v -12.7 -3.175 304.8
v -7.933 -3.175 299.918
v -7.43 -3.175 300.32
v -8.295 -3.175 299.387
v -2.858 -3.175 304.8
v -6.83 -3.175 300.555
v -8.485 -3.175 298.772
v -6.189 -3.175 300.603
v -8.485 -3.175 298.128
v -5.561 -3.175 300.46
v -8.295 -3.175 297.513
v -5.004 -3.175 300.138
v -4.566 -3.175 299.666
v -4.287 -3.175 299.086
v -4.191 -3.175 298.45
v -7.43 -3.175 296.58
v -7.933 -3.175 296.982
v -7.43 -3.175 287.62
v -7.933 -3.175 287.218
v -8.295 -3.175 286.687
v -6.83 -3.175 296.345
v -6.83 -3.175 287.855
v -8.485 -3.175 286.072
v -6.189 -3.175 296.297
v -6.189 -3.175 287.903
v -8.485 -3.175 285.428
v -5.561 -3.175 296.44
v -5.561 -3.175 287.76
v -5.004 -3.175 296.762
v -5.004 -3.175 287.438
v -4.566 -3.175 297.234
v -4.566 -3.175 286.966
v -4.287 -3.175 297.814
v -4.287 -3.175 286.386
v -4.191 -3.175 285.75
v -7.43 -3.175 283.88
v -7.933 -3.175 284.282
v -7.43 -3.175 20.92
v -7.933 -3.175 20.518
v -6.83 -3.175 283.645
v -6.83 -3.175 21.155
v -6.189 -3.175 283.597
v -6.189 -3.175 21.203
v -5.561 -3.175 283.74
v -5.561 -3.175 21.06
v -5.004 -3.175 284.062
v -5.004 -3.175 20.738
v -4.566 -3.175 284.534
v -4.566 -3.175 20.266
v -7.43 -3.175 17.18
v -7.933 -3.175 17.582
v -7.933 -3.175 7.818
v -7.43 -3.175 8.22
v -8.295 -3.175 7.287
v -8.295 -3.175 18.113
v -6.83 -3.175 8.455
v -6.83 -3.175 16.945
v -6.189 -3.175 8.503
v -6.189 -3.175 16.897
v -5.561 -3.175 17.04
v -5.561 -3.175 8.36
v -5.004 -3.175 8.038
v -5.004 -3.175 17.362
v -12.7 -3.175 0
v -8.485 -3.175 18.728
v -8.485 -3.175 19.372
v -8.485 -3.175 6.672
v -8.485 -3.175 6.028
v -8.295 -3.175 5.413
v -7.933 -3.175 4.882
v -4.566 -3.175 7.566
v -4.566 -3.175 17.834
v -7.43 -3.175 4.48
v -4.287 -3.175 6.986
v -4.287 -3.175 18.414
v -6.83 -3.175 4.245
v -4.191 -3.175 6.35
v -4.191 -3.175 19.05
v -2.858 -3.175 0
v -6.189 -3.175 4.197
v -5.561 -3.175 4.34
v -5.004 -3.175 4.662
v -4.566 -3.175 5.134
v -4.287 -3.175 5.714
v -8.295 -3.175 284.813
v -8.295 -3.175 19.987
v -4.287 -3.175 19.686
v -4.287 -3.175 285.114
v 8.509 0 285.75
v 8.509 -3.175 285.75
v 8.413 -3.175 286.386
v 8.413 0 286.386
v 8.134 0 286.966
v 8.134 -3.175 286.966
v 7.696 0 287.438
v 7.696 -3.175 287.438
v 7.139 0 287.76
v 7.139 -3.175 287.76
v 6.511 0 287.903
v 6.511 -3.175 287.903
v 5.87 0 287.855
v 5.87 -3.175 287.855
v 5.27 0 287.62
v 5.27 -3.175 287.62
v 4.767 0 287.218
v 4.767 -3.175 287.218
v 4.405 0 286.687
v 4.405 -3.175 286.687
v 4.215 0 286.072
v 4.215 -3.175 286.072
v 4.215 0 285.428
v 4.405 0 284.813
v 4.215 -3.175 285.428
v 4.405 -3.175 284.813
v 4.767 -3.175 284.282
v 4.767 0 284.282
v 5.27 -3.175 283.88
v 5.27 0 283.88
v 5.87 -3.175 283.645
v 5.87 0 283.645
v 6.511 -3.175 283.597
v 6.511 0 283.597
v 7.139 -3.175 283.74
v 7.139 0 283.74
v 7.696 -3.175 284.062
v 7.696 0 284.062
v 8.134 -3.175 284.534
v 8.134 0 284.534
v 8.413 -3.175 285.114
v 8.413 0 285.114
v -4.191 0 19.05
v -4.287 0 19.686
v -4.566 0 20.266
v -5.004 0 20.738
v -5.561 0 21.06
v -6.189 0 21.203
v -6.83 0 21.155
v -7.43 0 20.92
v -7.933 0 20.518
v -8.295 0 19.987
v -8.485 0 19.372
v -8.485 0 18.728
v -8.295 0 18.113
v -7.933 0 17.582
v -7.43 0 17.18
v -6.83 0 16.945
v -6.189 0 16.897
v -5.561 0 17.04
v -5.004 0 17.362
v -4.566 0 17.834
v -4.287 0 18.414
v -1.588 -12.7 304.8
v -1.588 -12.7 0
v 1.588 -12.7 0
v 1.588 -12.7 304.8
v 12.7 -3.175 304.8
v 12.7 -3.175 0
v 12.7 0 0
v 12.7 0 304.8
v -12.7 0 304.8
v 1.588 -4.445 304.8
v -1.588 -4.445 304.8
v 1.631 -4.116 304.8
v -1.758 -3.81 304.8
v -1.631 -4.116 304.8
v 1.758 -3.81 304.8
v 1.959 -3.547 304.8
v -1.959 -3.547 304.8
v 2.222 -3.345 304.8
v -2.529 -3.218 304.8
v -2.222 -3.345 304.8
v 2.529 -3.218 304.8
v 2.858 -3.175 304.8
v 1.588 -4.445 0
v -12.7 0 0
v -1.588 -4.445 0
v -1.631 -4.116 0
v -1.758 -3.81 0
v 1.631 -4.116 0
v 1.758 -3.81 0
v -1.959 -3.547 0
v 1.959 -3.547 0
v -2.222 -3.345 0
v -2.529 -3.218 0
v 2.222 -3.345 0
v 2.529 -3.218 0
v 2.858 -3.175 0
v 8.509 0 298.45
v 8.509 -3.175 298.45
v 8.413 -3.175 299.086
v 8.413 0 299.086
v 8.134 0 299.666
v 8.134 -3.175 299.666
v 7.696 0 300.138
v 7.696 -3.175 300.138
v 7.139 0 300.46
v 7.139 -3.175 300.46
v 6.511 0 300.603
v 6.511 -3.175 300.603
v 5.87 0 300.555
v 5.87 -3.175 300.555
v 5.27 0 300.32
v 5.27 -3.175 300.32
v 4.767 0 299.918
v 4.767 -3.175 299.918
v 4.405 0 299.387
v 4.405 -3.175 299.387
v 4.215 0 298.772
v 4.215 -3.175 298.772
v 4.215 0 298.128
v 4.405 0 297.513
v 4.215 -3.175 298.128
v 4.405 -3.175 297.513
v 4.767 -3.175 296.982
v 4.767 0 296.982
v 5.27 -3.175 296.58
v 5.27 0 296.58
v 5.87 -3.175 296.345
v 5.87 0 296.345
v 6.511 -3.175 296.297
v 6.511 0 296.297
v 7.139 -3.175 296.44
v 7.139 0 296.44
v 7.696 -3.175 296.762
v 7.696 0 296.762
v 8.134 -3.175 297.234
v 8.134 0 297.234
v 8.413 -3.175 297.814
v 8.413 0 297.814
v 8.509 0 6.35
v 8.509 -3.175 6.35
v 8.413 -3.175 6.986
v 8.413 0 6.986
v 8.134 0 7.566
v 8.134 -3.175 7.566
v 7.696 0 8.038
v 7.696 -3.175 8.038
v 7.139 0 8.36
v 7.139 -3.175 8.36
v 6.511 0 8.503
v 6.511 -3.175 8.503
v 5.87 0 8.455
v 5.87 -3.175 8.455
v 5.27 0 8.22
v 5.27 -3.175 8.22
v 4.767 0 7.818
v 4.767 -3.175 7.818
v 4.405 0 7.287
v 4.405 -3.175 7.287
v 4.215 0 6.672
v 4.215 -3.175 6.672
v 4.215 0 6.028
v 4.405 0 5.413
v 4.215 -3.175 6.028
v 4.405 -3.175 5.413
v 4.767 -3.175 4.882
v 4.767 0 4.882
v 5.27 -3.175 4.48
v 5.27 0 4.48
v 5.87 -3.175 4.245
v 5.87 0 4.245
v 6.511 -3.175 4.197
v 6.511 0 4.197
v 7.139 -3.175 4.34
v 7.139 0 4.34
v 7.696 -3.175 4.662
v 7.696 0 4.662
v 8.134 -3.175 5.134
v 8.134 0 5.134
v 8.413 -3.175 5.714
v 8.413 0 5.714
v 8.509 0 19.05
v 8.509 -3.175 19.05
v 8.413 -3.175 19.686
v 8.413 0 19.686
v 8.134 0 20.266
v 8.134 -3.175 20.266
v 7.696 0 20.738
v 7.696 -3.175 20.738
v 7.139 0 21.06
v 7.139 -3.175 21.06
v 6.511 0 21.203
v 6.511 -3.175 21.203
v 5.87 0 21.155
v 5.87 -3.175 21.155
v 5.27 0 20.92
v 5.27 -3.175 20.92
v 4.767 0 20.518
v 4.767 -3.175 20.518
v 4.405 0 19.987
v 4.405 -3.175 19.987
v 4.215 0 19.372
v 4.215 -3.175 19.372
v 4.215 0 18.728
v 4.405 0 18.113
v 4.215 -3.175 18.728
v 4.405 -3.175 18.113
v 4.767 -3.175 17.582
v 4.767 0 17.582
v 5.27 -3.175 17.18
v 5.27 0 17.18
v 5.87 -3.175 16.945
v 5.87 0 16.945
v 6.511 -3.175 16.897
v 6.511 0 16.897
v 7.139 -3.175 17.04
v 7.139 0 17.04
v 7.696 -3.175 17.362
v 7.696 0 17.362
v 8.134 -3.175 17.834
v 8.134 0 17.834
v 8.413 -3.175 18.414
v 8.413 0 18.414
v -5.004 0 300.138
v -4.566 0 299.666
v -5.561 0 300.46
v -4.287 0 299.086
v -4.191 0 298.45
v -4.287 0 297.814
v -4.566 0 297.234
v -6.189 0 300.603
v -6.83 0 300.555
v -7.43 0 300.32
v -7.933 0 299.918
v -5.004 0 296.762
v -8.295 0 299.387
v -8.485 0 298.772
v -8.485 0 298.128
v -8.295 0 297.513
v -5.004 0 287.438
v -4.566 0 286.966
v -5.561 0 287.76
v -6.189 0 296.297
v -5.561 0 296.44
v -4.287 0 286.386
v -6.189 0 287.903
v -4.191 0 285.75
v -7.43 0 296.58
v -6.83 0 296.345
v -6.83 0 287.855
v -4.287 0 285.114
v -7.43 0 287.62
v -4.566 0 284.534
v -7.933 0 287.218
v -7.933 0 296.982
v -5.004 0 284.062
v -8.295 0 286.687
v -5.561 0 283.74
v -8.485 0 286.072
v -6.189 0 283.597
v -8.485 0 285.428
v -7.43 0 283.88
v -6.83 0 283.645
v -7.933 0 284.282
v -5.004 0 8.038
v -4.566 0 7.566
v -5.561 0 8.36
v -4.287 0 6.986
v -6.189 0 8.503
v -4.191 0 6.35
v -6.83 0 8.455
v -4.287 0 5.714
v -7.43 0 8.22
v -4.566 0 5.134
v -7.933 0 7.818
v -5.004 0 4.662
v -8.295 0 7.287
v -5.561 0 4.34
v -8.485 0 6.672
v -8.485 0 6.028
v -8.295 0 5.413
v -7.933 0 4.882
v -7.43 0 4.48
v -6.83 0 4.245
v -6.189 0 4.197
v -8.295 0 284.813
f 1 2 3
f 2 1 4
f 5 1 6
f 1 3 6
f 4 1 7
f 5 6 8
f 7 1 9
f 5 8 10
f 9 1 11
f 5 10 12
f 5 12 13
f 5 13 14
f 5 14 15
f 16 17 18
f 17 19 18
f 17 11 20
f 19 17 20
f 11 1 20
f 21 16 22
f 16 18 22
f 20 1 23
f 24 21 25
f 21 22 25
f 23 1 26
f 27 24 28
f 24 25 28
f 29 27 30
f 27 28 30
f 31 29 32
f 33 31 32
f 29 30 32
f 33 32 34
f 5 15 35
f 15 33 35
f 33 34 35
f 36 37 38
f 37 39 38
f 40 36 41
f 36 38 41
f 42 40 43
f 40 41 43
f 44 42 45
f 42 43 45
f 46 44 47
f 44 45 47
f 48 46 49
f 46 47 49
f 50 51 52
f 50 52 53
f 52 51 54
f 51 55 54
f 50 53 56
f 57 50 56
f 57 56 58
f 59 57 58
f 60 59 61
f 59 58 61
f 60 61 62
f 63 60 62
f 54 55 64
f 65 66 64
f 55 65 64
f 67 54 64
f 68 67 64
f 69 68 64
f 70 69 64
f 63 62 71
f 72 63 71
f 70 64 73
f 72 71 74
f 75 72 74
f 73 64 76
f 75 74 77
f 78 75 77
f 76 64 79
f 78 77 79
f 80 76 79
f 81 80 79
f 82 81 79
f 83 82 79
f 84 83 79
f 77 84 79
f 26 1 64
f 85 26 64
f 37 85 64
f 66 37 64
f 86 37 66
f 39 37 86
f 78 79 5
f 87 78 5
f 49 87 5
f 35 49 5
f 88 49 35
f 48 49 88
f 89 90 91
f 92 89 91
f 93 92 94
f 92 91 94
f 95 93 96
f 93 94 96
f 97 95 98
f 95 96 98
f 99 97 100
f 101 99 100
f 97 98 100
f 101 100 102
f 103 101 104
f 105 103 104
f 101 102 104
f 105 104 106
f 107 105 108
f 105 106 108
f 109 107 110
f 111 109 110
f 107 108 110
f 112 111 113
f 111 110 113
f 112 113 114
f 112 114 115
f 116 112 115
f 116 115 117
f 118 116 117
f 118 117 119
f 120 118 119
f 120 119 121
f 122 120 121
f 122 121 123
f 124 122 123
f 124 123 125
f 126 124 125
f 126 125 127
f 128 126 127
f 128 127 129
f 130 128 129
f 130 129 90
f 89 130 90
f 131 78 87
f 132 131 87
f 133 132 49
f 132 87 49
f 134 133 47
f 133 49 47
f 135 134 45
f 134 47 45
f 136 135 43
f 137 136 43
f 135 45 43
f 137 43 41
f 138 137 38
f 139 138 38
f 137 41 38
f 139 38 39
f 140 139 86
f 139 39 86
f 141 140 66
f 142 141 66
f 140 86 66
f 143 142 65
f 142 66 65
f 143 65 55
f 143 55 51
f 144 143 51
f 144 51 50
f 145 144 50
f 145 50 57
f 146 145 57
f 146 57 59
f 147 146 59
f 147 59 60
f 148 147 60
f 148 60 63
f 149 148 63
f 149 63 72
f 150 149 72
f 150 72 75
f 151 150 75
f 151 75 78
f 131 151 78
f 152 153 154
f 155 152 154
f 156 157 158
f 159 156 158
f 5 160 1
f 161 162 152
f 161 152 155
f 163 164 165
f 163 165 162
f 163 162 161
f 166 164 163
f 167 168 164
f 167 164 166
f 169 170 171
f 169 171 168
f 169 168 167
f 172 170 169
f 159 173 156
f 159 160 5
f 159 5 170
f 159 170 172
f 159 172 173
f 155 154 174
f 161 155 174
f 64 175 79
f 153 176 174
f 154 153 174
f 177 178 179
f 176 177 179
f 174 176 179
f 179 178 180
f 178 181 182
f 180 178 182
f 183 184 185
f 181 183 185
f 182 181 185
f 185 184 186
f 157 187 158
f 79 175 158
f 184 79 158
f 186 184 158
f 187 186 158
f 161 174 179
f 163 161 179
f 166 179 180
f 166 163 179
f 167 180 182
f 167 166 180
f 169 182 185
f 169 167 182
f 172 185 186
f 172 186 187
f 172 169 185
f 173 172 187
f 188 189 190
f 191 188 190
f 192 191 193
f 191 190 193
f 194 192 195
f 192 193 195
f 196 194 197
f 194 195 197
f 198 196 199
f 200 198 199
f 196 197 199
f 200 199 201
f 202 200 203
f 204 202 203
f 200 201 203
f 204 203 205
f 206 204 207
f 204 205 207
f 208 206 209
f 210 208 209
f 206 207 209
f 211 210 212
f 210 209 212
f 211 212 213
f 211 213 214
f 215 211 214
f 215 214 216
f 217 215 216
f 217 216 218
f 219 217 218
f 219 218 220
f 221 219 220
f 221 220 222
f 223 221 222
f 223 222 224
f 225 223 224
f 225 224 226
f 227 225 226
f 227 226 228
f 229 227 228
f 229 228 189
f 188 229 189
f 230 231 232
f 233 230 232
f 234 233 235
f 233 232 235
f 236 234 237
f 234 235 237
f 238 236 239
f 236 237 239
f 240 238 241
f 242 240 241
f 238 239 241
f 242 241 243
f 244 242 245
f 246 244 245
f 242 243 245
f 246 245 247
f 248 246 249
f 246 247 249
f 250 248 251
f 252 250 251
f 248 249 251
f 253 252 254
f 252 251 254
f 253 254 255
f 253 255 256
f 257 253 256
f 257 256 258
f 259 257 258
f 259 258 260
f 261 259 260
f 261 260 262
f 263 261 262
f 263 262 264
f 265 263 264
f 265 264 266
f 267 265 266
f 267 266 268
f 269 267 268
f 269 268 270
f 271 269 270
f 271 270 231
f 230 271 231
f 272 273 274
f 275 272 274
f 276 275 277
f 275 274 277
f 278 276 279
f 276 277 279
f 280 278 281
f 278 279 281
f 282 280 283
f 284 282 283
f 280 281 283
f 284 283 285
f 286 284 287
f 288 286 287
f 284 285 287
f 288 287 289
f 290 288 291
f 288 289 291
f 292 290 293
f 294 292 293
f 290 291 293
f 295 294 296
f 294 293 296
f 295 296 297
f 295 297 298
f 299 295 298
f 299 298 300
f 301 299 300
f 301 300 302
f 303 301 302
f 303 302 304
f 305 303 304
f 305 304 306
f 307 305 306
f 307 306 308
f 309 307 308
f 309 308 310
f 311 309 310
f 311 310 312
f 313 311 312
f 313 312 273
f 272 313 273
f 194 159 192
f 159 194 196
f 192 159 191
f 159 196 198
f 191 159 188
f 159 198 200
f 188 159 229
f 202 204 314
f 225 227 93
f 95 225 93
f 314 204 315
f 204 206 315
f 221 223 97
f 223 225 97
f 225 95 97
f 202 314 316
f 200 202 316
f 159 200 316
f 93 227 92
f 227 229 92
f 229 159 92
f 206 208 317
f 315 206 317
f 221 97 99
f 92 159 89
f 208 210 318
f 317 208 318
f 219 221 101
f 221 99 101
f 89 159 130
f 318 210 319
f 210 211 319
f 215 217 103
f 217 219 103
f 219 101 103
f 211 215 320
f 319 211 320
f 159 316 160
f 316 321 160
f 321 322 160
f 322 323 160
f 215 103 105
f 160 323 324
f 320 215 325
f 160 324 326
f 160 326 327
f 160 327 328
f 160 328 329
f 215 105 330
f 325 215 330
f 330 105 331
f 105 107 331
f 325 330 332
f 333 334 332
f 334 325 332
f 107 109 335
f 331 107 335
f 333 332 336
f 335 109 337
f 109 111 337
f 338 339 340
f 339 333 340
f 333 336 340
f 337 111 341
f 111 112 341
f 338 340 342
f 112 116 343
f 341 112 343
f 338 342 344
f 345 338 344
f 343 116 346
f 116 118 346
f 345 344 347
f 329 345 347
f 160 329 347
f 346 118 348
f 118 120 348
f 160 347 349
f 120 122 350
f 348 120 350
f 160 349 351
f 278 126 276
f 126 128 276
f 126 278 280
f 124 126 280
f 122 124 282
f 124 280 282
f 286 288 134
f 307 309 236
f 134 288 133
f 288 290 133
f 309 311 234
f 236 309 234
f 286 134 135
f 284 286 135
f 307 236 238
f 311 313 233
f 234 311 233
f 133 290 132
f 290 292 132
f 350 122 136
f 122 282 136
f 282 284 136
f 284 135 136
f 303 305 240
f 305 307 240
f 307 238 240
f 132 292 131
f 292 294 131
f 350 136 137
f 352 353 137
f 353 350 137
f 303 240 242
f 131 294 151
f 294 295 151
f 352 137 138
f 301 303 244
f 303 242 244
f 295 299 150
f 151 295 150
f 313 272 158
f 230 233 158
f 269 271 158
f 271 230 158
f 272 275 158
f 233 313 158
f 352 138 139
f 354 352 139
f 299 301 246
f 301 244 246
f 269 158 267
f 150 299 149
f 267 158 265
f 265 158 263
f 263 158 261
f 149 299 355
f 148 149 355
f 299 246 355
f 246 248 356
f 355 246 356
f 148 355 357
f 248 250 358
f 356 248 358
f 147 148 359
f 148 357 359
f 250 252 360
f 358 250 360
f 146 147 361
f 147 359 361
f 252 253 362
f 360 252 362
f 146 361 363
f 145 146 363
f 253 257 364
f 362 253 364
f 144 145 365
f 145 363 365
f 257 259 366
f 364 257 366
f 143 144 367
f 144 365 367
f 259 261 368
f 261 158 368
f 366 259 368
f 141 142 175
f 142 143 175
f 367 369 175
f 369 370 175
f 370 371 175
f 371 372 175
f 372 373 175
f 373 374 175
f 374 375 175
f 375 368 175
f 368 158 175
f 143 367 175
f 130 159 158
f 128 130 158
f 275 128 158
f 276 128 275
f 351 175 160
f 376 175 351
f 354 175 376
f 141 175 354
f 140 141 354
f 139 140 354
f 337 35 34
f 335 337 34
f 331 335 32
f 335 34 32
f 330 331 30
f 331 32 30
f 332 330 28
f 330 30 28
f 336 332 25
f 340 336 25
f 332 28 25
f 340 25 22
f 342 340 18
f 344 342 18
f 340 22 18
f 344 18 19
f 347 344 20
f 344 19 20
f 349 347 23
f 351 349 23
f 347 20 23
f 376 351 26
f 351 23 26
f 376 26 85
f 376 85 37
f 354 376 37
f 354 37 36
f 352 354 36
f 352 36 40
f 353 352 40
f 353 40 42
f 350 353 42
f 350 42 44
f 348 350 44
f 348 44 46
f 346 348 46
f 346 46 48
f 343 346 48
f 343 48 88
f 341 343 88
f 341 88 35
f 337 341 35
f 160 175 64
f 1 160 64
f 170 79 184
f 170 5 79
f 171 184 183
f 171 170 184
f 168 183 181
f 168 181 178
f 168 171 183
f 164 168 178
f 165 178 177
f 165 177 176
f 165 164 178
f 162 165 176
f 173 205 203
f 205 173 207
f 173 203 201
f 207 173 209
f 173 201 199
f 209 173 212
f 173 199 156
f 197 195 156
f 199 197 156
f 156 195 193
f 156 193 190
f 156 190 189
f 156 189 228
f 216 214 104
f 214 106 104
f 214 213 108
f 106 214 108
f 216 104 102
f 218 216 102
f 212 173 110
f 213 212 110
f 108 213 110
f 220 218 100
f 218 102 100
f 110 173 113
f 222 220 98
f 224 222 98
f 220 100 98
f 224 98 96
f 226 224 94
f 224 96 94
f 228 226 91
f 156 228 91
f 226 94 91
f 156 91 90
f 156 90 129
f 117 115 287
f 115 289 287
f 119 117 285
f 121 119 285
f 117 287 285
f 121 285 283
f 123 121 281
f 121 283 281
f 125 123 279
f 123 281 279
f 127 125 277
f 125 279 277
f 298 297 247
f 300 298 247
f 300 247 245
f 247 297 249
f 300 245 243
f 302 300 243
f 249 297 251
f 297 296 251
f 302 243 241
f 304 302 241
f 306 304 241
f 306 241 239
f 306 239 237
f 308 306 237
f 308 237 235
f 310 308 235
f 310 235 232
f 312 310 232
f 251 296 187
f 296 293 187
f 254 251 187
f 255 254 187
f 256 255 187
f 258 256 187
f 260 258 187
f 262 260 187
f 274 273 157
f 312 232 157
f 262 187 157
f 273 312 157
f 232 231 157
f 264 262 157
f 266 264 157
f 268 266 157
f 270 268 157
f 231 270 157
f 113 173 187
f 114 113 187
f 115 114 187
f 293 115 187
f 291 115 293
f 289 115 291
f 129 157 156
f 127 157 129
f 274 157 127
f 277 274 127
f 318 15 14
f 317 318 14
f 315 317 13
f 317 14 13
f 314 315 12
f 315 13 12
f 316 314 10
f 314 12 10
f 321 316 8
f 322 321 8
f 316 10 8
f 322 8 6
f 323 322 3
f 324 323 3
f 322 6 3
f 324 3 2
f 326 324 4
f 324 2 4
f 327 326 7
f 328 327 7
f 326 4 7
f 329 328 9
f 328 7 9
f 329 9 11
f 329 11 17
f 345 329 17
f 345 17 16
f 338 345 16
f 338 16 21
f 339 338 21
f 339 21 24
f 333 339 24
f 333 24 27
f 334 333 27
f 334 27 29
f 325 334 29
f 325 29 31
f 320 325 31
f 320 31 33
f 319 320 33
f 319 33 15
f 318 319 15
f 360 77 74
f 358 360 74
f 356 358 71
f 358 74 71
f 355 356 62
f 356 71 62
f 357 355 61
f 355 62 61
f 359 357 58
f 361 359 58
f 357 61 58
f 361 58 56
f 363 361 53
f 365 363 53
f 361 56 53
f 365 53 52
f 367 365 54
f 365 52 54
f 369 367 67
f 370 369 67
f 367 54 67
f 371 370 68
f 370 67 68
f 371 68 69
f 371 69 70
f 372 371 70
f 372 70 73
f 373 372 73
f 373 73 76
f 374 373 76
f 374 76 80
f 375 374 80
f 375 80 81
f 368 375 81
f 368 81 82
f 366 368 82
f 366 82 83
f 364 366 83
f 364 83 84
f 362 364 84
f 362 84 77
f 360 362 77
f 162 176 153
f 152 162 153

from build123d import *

# Parameters (mm, degrees)
F1_DEPTH = 304.8
F2_R     = 1.27
F4_D     = 4.318
F4_DEPTH = 25.4
F4_TIP   = 1.2972580765


with BuildPart() as f1:
    # F0 (on Top) → F1 (new body)
    with BuildSketch(Plane.XY):
        Polygon((12.7, 0), (0, 0), (-12.7, 0), (-12.7, -3.175), (-1.5875, -3.175), (-1.5875, -12.7), (0, -12.7), (1.5875, -12.7), (1.5875, -3.175), (12.7, -3.175), align=None)
    extrude(amount=F1_DEPTH)

    # F2
    f2_edges = [f1.edges().sort_by_distance(p)[0] for p in [
        (-1.5875, -3.175, 152.4),
        (1.5875, -3.175, 152.4),
    ]]
    fillet(f2_edges, radius=F2_R)

    # F4
    with Locations(Plane(origin=(0, 0, 0), x_dir=(-1, 0, 0), z_dir=(0, 1, 0))):
        with Locations((-6.35, 298.45), (-6.35, 285.75), (6.35, 285.75), (6.35, 298.45), (-6.35, 6.35), (-6.35, 19.05), (6.35, 19.05), (6.35, 6.35)):
            Hole(F4_D / 2, depth=F4_DEPTH)
            with Locations((0, 0, -(F4_DEPTH + F4_TIP / 2))):  # 118° drill point
                Cone(0, F4_D / 2, F4_TIP, mode=Mode.SUBTRACT)


solid = f1.part
